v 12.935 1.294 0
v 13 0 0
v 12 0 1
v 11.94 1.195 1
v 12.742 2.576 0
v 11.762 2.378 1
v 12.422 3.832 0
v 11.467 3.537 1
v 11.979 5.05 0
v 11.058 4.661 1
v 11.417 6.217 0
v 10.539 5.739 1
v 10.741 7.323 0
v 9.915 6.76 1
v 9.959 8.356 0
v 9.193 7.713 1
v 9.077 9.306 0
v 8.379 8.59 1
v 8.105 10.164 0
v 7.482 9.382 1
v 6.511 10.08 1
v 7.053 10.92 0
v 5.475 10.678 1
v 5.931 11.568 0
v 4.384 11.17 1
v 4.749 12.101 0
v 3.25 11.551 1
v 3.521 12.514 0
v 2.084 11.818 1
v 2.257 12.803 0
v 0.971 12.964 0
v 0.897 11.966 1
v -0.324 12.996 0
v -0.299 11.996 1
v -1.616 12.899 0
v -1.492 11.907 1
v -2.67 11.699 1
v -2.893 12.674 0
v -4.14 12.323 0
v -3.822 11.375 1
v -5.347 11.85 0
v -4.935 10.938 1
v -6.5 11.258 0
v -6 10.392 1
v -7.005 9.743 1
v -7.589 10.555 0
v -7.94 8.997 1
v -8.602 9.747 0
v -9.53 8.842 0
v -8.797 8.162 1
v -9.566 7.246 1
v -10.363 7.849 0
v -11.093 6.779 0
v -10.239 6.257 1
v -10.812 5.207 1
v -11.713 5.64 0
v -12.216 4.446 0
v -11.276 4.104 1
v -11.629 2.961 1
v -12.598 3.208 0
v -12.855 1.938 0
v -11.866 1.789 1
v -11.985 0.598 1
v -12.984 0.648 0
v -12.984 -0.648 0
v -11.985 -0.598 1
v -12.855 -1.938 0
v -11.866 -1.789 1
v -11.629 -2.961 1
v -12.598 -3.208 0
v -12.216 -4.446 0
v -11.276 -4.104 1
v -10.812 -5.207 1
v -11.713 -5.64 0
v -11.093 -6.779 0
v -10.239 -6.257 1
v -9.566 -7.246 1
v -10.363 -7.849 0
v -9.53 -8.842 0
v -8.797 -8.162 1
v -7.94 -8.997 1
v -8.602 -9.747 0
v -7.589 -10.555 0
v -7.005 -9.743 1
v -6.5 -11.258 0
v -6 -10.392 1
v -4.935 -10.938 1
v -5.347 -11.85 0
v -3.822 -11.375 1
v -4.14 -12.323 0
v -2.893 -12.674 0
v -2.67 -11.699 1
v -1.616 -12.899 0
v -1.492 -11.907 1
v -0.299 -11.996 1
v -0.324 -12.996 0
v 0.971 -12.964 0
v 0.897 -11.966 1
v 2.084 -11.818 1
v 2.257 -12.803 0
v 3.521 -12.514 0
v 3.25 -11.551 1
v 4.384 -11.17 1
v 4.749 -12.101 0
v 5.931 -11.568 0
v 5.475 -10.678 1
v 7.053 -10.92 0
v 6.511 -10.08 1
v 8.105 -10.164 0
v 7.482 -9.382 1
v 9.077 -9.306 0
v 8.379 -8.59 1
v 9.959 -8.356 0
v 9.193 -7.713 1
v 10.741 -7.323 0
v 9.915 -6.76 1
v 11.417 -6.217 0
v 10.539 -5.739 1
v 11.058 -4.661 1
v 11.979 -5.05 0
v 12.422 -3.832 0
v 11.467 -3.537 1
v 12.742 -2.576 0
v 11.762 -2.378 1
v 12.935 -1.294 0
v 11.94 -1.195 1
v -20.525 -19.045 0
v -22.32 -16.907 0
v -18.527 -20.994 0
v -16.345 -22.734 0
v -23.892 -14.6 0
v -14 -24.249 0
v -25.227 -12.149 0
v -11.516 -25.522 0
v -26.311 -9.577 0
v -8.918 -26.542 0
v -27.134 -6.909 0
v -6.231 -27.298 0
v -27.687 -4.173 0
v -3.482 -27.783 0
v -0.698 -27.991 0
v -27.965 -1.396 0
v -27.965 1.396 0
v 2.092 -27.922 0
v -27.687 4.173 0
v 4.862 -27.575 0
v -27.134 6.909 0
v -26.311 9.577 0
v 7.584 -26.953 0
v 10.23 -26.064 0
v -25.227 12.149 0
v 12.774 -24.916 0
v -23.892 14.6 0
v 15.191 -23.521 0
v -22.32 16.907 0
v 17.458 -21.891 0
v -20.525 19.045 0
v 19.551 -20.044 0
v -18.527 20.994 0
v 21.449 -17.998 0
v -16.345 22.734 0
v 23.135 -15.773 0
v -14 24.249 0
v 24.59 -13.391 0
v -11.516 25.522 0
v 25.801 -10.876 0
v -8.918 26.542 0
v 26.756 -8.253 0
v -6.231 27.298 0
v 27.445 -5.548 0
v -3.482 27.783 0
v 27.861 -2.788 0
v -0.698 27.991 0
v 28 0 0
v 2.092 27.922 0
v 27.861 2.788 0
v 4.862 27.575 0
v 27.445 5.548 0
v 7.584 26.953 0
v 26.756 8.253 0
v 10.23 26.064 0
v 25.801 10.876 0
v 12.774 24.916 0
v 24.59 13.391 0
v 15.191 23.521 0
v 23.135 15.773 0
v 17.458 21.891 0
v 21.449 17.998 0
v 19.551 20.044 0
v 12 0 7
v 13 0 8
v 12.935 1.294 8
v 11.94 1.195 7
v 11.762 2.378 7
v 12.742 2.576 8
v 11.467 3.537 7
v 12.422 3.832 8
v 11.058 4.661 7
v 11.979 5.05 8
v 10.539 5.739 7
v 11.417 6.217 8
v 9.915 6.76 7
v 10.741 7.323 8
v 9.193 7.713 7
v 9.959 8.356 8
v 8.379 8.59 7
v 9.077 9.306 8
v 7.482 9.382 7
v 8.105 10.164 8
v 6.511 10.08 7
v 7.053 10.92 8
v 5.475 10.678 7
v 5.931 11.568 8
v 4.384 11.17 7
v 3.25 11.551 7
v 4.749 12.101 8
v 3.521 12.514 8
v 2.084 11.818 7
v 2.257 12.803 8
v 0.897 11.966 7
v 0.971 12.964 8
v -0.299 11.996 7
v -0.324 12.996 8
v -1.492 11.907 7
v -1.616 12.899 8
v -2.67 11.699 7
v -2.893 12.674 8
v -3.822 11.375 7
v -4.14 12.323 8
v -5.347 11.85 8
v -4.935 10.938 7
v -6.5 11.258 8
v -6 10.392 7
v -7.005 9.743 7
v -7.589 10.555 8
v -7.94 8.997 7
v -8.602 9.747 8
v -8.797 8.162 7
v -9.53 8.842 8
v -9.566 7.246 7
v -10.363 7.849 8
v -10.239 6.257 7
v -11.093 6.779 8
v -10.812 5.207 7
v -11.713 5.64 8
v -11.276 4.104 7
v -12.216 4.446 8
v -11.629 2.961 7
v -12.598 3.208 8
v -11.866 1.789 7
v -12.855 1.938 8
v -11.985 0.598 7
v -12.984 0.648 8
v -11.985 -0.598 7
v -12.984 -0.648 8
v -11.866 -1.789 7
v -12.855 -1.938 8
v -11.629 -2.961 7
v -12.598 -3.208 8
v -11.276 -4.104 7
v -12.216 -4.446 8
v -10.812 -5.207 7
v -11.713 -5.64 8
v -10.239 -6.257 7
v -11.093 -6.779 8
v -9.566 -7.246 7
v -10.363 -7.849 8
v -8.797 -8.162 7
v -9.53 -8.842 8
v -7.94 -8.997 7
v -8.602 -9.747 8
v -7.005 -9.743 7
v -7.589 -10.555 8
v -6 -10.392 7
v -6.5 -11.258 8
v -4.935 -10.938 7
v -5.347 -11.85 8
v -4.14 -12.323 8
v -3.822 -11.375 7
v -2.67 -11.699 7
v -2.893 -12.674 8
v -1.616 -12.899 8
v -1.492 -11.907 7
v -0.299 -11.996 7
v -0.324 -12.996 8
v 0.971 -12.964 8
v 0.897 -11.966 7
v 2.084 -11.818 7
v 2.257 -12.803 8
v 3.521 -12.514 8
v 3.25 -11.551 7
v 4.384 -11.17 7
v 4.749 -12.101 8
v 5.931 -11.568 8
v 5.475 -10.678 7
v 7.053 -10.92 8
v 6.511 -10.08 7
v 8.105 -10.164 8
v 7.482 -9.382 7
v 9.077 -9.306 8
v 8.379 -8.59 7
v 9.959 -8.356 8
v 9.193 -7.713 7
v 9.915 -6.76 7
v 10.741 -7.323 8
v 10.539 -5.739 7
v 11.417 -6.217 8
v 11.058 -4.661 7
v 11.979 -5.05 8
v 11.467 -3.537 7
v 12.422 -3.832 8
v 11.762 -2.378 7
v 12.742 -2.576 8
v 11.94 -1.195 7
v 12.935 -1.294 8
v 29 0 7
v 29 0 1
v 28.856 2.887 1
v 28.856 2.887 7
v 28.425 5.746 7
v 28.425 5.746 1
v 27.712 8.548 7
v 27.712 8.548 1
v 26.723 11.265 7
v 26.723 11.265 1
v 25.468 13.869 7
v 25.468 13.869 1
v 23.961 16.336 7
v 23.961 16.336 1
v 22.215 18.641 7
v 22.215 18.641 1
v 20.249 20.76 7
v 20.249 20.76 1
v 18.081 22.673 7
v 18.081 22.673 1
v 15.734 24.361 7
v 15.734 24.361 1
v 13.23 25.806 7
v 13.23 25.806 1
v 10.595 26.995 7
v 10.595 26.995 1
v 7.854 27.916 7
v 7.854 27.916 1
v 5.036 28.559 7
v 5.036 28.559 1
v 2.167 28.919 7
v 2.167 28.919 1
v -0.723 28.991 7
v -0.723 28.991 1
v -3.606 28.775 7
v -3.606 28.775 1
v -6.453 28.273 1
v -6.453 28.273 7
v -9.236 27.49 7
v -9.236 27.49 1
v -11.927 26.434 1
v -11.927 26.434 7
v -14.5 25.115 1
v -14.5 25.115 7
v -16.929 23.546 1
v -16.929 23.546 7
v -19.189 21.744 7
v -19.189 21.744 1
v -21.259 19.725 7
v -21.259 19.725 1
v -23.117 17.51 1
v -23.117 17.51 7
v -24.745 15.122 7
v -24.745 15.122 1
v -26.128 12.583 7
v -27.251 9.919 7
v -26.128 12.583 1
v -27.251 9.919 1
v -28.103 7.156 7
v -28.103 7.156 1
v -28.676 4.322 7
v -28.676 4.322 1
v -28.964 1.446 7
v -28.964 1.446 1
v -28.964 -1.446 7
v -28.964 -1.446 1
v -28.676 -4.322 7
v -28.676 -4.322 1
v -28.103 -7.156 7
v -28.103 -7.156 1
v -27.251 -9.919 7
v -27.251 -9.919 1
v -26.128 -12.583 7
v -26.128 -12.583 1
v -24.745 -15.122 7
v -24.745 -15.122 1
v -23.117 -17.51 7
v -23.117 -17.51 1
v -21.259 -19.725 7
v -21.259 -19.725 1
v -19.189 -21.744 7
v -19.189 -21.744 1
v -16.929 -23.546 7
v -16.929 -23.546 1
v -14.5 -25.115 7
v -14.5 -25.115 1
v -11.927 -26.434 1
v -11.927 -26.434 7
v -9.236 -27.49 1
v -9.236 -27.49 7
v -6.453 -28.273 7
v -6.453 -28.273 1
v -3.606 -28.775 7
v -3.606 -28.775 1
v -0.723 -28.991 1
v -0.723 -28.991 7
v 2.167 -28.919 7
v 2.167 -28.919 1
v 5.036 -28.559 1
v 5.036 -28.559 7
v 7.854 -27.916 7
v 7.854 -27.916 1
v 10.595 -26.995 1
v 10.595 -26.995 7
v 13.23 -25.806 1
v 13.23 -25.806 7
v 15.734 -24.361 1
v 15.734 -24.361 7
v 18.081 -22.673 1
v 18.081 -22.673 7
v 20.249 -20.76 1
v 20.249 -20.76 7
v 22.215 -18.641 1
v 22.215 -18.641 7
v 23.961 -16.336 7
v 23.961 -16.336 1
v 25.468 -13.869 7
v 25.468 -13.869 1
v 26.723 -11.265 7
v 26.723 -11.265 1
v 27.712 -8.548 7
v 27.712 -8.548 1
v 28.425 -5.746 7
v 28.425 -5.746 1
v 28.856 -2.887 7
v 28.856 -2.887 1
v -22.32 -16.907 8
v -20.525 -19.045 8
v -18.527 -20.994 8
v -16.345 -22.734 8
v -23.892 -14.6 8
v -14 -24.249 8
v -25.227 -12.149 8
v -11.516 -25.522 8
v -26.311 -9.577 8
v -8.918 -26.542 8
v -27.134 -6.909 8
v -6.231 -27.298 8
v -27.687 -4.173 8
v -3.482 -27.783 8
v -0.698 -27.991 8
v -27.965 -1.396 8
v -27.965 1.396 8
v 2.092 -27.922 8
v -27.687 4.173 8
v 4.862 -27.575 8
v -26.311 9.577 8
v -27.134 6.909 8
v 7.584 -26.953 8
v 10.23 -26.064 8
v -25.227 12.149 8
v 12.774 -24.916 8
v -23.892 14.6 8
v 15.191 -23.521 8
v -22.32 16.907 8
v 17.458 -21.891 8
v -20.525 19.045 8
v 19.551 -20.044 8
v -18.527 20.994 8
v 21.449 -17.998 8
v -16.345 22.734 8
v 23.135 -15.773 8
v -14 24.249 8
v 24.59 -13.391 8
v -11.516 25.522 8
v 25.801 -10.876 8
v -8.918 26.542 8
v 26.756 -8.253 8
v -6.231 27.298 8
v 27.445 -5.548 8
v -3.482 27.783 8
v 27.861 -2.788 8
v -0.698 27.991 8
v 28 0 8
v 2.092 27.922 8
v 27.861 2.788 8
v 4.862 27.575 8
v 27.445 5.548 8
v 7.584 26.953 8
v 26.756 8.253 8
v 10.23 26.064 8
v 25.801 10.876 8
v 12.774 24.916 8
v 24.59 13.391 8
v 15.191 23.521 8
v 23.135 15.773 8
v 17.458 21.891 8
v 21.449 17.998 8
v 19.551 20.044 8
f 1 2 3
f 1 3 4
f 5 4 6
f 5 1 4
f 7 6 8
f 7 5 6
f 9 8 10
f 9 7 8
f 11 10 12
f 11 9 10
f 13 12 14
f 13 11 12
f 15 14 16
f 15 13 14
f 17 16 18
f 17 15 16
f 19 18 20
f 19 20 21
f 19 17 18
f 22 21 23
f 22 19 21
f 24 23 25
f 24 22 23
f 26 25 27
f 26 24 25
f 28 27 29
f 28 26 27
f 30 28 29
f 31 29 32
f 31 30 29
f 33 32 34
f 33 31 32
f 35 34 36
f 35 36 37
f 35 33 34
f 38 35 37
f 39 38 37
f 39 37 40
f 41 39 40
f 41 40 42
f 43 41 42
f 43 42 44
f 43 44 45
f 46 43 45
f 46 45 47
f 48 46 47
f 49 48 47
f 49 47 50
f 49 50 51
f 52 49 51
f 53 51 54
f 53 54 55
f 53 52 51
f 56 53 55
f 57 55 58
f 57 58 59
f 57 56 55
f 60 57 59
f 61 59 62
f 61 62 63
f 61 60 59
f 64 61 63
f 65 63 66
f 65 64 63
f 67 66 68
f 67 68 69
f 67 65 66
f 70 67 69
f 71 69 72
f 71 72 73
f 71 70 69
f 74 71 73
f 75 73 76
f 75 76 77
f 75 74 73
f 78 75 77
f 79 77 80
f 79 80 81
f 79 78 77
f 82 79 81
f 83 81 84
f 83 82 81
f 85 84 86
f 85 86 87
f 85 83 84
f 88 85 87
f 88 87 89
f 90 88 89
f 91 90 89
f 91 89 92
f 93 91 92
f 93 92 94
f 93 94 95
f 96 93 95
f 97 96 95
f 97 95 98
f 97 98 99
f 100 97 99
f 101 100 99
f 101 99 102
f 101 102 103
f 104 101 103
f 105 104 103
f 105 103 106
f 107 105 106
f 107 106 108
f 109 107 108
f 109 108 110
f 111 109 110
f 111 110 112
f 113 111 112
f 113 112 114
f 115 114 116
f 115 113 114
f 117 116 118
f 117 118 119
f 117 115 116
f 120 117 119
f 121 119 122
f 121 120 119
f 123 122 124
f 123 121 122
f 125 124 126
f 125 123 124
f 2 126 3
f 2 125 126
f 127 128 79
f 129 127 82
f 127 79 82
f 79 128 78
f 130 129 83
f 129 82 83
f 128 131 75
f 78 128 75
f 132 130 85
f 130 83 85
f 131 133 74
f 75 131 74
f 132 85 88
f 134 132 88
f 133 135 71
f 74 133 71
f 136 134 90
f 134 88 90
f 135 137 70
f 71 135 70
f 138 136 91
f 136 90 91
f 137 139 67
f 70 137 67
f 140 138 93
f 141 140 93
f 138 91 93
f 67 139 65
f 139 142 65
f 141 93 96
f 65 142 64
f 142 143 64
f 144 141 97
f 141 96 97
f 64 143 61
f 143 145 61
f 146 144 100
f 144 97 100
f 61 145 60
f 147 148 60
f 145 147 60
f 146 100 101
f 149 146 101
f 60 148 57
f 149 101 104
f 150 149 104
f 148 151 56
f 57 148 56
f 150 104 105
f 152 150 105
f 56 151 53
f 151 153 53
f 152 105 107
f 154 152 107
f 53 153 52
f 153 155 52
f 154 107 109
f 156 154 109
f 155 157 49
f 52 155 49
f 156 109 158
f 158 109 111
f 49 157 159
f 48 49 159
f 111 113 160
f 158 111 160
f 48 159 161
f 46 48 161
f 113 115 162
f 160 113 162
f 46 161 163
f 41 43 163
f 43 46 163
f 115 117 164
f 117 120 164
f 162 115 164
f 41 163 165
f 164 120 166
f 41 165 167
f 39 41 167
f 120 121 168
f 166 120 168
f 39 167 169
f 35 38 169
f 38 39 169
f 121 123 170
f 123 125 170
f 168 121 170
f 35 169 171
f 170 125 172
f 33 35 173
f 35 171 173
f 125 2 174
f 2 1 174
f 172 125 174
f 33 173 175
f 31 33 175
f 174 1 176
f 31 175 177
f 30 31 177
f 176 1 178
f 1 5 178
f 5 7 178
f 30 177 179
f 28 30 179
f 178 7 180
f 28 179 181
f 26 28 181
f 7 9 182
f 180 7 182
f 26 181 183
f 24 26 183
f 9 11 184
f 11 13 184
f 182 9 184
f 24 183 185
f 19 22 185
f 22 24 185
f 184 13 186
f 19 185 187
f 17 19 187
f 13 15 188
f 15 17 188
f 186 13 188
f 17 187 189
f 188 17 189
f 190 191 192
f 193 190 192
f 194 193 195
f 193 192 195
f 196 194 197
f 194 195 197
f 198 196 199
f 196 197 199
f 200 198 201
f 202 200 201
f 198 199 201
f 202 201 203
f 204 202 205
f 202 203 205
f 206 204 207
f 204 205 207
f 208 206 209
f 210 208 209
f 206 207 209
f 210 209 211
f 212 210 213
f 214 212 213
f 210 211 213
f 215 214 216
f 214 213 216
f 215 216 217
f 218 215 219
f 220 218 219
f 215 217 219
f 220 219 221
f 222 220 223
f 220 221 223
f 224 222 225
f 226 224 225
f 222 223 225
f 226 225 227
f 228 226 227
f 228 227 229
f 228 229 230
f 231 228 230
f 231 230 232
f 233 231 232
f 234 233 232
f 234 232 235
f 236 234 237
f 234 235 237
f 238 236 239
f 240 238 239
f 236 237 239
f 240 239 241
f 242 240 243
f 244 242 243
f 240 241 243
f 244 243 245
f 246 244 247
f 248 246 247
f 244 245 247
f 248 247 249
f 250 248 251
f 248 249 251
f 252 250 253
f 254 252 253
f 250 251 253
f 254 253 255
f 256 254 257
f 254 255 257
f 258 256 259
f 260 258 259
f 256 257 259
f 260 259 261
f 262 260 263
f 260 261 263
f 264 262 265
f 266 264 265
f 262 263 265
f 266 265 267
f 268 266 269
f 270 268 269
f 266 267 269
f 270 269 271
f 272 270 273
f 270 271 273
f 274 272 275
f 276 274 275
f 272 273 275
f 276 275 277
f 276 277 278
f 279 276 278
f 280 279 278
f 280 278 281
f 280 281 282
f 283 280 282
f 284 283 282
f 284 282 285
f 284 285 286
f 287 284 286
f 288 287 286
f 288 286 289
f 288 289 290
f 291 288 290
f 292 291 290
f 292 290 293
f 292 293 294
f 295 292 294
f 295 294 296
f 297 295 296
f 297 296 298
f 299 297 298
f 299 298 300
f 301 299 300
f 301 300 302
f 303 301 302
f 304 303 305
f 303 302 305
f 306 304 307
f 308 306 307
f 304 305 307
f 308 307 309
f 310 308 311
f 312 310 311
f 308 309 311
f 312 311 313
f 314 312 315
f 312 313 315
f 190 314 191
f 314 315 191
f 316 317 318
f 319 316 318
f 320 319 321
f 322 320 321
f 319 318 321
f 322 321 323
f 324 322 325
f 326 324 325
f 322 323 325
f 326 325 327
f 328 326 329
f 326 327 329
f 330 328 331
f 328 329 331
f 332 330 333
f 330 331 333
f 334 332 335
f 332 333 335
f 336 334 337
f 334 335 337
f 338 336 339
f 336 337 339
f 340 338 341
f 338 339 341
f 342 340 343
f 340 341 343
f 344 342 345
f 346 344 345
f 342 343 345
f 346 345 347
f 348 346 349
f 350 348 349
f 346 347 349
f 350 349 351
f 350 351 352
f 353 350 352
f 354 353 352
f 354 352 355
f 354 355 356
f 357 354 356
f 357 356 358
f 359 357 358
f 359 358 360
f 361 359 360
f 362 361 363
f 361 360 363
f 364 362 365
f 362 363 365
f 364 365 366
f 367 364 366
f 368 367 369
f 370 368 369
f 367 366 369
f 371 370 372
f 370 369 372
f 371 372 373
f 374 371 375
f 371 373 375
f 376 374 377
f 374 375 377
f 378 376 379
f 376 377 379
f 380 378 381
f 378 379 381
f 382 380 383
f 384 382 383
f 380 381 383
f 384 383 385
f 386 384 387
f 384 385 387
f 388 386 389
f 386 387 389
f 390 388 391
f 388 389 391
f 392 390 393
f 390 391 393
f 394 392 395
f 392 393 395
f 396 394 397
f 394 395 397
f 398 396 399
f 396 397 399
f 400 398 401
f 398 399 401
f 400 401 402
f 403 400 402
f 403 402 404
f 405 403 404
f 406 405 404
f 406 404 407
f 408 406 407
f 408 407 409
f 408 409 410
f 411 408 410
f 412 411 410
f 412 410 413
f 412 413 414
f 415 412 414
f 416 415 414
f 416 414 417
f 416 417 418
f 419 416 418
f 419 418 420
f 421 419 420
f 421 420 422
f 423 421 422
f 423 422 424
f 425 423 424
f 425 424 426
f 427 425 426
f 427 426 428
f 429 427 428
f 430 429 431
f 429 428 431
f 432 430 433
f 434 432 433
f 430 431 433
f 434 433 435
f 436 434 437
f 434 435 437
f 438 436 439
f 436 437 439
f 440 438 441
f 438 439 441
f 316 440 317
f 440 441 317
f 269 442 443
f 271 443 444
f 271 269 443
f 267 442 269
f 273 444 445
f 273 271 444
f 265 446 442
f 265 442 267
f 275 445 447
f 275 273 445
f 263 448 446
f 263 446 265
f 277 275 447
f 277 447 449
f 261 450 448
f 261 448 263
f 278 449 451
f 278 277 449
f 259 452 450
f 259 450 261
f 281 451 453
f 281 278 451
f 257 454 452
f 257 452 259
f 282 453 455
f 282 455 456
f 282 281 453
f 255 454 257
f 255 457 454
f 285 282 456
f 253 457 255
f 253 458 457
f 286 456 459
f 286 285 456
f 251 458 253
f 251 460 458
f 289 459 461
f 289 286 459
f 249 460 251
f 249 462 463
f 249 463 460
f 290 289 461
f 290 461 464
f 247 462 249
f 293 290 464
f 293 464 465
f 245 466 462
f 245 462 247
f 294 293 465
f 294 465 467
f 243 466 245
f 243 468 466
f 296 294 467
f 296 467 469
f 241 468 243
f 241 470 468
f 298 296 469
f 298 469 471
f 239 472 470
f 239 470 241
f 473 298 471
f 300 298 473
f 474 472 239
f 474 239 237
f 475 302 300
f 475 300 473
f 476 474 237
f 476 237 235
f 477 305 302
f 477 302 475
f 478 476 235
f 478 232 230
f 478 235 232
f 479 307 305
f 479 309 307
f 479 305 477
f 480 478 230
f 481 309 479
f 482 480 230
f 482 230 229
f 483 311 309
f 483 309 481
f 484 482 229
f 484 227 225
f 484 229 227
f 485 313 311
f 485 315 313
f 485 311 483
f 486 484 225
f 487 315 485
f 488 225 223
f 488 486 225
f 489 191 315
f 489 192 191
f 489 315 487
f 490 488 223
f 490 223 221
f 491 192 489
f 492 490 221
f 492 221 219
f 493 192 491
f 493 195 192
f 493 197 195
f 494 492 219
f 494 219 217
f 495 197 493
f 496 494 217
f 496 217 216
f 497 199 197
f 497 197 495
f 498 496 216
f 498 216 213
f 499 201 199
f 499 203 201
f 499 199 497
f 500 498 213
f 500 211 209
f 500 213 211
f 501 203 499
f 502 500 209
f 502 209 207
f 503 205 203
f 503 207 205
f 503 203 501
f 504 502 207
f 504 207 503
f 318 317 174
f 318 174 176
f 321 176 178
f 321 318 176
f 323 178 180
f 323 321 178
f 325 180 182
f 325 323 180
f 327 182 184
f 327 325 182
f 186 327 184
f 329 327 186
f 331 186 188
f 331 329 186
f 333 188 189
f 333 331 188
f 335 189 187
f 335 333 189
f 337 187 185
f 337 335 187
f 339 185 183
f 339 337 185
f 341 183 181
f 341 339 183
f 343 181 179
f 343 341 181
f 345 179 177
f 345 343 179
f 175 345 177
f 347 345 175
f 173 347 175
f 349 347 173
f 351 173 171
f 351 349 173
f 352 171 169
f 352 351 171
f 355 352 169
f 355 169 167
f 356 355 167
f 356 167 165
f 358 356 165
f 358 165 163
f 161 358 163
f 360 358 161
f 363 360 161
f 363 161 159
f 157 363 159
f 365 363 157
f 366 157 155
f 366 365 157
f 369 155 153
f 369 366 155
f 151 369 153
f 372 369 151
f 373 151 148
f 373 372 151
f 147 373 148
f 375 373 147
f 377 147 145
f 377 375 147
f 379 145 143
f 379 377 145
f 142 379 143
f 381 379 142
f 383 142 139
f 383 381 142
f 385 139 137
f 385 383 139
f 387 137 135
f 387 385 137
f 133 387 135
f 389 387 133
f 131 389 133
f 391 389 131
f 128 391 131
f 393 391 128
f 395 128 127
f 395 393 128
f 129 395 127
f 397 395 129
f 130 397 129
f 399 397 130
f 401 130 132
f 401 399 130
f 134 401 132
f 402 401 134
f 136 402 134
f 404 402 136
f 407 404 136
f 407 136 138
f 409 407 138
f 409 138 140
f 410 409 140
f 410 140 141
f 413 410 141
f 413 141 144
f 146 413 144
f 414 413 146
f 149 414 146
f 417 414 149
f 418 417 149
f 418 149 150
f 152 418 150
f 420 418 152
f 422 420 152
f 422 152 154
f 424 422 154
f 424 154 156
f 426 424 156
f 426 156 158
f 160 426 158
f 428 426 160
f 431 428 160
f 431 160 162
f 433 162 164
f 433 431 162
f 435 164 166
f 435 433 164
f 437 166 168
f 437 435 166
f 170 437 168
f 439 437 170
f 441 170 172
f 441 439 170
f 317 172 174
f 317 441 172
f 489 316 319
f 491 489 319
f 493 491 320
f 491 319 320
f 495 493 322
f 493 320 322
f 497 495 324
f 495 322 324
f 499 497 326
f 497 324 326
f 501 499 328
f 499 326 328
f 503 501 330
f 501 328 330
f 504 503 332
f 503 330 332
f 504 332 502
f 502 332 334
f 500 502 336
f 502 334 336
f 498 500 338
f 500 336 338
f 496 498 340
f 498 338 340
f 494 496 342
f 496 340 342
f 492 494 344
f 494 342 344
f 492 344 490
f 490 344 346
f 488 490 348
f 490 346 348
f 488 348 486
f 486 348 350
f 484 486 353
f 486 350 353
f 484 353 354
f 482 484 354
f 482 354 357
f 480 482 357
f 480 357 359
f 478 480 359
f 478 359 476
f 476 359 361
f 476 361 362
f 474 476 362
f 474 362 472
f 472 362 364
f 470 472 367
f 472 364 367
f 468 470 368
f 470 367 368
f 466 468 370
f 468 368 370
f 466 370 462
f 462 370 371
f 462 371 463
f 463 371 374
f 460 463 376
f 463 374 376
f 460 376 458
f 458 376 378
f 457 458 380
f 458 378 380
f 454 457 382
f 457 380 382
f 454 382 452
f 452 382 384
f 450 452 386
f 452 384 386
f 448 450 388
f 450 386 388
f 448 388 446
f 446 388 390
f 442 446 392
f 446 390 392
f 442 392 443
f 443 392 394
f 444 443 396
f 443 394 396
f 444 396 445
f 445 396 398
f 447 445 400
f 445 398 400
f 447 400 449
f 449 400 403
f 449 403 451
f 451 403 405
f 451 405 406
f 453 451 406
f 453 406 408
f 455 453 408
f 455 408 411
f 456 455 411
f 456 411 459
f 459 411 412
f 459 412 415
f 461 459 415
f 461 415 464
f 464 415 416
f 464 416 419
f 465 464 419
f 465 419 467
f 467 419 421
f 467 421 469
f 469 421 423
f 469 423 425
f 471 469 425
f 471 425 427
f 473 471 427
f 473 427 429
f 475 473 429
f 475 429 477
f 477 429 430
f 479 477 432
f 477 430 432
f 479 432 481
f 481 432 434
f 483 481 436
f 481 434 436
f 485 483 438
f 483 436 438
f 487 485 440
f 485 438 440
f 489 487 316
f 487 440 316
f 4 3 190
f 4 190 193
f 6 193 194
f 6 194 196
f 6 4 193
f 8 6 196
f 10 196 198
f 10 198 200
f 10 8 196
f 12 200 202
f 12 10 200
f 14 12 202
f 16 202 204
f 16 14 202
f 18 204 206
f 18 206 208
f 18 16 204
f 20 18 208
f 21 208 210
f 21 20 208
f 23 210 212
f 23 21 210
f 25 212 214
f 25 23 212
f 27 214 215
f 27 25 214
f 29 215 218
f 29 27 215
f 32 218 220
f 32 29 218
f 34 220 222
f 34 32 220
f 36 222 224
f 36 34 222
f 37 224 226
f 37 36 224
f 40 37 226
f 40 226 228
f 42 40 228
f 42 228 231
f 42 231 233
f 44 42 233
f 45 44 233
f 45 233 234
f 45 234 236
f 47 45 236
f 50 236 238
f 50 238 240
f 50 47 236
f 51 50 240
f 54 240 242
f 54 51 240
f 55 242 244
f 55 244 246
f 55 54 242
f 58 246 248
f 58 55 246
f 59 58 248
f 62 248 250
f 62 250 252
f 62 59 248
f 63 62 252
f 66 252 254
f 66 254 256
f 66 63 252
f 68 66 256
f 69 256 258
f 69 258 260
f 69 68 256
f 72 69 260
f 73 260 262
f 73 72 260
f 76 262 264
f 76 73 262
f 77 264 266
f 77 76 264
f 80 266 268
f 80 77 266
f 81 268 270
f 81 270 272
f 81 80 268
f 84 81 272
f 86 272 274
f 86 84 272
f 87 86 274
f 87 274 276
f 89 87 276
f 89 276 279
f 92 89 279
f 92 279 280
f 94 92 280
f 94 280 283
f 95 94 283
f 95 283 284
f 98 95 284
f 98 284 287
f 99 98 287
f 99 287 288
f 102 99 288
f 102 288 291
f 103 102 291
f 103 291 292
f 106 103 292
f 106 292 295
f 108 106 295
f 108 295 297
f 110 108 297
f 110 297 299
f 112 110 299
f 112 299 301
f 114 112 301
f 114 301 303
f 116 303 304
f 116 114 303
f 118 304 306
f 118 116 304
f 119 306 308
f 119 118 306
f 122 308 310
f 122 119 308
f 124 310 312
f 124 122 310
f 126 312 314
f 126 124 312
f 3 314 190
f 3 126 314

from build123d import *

# Parameters (mm, degrees)
SKETCH1_R           = 29
SKETCH1_R_2         = 12
BOSS_EXTRUDE1_DEPTH = 8
CHAMFER1_SIZE       = 1
CHAMFER2_SIZE       = 1


with BuildPart() as part:
    # Sketch1 → Boss-Extrude1 (new body)
    with BuildSketch(Plane.XY):
        Circle(SKETCH1_R)
        Circle(SKETCH1_R_2, mode=Mode.SUBTRACT)
    extrude(amount=BOSS_EXTRUDE1_DEPTH)

    # Chamfer1
    chamfer1_edges = [part.edges().sort_by_distance(p)[0] for p in [
        (-12, 0, 0),
        (-12, 0, 8),
    ]]
    chamfer(chamfer1_edges, length=CHAMFER1_SIZE)

    # Chamfer2
    chamfer2_edges = [part.edges().sort_by_distance(p)[0] for p in [
        (-29, 0, 0),
        (-29, 0, 8),
    ]]
    chamfer(chamfer2_edges, length=CHAMFER2_SIZE)


solid = part.part
